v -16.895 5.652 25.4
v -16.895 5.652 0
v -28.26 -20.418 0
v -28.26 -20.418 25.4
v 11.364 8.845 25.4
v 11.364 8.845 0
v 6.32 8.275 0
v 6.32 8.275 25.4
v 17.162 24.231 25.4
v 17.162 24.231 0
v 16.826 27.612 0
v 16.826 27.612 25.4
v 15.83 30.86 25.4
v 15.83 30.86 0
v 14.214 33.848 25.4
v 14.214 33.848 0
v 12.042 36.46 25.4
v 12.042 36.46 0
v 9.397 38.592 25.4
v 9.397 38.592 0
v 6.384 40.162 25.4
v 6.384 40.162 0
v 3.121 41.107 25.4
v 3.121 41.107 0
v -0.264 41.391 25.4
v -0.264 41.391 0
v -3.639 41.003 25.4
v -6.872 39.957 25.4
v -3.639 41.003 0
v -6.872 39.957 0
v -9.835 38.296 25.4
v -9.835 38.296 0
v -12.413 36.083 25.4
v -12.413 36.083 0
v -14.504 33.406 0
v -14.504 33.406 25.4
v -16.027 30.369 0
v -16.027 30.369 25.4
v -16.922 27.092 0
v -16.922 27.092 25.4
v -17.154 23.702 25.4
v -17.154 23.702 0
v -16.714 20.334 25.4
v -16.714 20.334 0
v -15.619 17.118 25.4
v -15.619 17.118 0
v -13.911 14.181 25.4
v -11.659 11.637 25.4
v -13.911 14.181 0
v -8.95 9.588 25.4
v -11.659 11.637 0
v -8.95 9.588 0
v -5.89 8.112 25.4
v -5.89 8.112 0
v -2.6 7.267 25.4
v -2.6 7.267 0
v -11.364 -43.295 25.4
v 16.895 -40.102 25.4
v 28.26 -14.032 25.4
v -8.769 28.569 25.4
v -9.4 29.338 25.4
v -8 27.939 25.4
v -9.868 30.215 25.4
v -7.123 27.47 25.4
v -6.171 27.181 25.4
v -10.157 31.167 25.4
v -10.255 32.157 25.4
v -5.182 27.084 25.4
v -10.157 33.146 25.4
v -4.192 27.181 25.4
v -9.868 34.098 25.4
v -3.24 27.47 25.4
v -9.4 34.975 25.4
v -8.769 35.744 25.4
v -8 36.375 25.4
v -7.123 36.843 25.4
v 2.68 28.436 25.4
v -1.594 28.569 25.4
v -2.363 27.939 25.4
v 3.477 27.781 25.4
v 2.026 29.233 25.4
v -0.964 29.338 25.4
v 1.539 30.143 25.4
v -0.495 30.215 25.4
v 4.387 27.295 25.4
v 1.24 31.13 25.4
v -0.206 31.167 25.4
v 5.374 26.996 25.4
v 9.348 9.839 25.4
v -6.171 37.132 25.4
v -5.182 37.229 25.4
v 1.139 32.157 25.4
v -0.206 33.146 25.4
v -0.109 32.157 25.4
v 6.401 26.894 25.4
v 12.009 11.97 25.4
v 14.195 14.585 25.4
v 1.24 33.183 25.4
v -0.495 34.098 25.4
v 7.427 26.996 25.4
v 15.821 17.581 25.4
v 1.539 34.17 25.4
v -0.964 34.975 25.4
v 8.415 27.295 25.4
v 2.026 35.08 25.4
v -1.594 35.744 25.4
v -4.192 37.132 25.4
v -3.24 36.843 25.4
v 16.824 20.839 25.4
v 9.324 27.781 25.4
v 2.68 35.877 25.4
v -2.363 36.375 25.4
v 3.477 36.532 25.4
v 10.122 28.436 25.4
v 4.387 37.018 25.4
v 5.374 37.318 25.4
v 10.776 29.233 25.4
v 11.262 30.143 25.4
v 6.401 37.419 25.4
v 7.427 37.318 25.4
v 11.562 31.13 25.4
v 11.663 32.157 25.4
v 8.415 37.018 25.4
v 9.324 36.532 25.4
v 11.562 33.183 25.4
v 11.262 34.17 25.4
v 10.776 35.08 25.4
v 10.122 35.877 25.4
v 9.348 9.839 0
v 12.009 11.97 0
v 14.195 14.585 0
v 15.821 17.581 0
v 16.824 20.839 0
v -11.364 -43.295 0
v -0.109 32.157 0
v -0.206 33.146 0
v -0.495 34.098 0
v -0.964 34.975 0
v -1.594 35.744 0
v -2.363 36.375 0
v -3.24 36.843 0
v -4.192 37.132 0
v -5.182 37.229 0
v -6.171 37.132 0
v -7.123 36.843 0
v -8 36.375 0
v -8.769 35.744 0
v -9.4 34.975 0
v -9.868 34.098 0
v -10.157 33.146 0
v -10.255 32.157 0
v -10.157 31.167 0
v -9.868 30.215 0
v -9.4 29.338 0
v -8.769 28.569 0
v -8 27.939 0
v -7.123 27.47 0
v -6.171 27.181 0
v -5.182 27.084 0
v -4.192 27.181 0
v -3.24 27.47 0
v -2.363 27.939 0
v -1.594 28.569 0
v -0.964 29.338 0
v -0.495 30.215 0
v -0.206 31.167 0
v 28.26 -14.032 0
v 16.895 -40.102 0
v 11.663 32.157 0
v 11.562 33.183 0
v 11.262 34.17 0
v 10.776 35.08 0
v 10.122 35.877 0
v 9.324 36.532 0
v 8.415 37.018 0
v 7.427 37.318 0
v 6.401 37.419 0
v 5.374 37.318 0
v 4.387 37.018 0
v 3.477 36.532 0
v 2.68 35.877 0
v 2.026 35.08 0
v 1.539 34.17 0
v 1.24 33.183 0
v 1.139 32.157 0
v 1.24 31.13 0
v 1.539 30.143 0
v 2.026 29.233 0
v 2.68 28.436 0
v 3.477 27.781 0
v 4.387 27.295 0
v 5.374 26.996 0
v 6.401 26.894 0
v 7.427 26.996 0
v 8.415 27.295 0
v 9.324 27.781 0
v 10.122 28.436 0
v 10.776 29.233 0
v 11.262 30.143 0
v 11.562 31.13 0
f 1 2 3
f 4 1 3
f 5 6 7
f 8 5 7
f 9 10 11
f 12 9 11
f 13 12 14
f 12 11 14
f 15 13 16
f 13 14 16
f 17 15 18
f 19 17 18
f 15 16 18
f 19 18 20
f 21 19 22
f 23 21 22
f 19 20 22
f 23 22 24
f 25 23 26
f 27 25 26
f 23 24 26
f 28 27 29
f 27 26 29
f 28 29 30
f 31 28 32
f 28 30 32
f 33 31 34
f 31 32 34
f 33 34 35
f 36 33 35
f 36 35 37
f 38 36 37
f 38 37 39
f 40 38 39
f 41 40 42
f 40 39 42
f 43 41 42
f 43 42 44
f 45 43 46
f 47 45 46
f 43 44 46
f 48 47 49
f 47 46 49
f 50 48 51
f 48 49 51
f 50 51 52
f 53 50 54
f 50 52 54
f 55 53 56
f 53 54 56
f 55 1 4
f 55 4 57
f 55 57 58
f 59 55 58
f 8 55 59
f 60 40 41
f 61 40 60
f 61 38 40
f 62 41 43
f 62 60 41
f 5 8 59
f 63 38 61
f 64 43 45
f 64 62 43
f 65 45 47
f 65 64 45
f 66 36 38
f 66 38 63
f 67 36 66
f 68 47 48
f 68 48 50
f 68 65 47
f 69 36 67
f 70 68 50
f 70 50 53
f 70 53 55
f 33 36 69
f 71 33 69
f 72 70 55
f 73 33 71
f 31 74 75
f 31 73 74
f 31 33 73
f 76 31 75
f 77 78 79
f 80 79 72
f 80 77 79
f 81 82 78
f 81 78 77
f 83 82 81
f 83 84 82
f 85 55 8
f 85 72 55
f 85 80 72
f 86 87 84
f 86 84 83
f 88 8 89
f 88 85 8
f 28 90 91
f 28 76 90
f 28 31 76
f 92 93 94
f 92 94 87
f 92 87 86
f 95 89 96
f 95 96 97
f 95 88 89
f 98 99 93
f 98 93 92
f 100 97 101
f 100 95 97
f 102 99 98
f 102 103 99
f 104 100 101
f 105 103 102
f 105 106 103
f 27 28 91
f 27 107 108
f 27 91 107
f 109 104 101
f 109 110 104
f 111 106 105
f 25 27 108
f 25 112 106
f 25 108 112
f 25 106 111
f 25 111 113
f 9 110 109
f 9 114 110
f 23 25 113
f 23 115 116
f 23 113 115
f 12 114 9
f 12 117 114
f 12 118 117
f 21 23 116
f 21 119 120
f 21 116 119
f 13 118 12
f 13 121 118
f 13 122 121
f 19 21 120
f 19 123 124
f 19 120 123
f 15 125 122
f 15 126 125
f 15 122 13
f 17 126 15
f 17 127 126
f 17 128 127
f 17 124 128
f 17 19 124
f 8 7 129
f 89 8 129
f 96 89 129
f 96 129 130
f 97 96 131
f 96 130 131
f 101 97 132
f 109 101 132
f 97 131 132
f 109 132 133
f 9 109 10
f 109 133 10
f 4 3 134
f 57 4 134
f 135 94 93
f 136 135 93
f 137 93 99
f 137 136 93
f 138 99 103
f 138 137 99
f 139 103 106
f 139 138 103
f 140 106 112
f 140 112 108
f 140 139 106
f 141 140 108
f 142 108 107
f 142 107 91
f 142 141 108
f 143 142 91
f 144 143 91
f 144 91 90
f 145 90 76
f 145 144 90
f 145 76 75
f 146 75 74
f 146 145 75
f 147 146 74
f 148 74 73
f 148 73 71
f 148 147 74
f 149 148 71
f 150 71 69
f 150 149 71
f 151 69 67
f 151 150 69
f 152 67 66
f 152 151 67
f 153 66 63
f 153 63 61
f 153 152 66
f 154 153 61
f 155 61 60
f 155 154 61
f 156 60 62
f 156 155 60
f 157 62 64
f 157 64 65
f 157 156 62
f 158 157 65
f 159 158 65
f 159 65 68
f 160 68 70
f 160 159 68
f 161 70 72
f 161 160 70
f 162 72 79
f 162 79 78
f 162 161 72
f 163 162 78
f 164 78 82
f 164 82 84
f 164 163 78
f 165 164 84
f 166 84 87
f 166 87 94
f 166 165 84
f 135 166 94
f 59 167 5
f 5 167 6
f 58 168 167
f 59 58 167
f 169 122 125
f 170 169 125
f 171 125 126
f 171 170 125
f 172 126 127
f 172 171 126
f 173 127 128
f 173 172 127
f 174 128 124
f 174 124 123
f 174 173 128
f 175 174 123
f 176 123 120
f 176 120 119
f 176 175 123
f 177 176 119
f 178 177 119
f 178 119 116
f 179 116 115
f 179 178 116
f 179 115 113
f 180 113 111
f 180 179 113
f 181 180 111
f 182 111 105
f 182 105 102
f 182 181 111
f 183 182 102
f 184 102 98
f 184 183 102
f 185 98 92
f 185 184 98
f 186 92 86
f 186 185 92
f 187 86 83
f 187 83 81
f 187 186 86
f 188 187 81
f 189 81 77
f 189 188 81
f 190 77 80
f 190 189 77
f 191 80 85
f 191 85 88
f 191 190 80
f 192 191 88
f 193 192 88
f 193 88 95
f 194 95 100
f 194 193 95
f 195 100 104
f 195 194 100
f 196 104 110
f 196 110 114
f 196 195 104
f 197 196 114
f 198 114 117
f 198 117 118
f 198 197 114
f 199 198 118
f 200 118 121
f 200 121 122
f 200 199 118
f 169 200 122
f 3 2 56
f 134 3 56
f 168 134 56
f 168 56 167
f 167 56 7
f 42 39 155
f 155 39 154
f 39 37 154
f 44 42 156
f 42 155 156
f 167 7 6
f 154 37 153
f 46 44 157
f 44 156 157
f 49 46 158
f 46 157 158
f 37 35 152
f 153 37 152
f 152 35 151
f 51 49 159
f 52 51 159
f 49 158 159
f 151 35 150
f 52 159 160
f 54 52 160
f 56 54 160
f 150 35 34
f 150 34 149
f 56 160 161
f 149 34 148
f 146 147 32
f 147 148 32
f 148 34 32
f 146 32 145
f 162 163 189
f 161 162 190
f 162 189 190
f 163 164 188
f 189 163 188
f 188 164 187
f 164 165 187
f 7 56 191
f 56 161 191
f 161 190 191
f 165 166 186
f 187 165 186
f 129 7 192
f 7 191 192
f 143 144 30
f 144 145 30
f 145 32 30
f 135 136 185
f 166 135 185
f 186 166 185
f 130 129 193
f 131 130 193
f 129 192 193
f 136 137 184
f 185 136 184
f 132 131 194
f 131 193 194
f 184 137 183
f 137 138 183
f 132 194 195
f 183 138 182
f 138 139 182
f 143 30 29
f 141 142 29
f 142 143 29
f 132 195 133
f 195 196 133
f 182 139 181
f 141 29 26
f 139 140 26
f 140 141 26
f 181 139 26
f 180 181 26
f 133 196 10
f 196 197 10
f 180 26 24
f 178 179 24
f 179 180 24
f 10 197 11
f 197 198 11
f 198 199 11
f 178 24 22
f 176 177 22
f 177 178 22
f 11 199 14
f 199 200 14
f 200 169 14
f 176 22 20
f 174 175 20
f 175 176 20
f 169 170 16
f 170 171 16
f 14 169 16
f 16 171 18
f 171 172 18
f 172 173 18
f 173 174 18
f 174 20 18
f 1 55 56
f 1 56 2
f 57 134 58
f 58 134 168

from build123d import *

# Parameters (mm, degrees)
F0_R     = 5.0729517485
F0_R_2   = 5.2620851013
F1_DEPTH = 25.4


with BuildPart() as f1:
    # F0 (on Top) → F1 (new body)
    with BuildSketch(Plane.XY):
        with BuildLine():
            ThreePointArc((6.3195106697, 8.2748654283), (14.1949379045, 14.5853247175), (17.1620698292, 24.23106879))
            ThreePointArc((17.1620698292, 24.23106879), (-11.1785461031, 37.2532325059), (-2.5997362388, 7.2670476773))
            Line((-2.5997362388, 7.2670476773), (6.3195106697, 8.2748654283))
        make_face()
        with Locations((-5.181599874, 32.1565270424)):
            Circle(F0_R, mode=Mode.SUBTRACT)
        with Locations((6.4008007757, 32.1565270424)):
            Circle(F0_R_2, mode=Mode.SUBTRACT)
        with BuildLine():
            Line((6.3195106697, 8.2748654283), (-2.5997362388, 7.2670476773))
            ThreePointArc((-2.5997362388, 7.2670476773), (1.9269417763, 7.1775197102), (6.3195106697, 8.2748654283))
        make_face()
        with BuildLine():
            ThreePointArc((6.3195106697, 8.2748654283), (1.9269417763, 7.1775197102), (-2.5997362388, 7.2670476773))
            Line((-2.5997362388, 7.2670476773), (-16.8951326659, 5.651759478))
            Line((-16.8951326659, 5.651759478), (-28.2595672484, -20.4183186727))
            Line((-28.2595672484, -20.4183186727), (-11.3644345824, -43.2952467961))
            Line((-11.3644345824, -43.2952467961), (16.8951326659, -40.1020967688))
            Line((16.8951326659, -40.1020967688), (28.2595672484, -14.0320186181))
            Line((28.2595672484, -14.0320186181), (11.3644345824, 8.8449095053))
            Line((11.3644345824, 8.8449095053), (6.3195106697, 8.2748654283))
        make_face()
    extrude(amount=F1_DEPTH)


solid = f1.part
